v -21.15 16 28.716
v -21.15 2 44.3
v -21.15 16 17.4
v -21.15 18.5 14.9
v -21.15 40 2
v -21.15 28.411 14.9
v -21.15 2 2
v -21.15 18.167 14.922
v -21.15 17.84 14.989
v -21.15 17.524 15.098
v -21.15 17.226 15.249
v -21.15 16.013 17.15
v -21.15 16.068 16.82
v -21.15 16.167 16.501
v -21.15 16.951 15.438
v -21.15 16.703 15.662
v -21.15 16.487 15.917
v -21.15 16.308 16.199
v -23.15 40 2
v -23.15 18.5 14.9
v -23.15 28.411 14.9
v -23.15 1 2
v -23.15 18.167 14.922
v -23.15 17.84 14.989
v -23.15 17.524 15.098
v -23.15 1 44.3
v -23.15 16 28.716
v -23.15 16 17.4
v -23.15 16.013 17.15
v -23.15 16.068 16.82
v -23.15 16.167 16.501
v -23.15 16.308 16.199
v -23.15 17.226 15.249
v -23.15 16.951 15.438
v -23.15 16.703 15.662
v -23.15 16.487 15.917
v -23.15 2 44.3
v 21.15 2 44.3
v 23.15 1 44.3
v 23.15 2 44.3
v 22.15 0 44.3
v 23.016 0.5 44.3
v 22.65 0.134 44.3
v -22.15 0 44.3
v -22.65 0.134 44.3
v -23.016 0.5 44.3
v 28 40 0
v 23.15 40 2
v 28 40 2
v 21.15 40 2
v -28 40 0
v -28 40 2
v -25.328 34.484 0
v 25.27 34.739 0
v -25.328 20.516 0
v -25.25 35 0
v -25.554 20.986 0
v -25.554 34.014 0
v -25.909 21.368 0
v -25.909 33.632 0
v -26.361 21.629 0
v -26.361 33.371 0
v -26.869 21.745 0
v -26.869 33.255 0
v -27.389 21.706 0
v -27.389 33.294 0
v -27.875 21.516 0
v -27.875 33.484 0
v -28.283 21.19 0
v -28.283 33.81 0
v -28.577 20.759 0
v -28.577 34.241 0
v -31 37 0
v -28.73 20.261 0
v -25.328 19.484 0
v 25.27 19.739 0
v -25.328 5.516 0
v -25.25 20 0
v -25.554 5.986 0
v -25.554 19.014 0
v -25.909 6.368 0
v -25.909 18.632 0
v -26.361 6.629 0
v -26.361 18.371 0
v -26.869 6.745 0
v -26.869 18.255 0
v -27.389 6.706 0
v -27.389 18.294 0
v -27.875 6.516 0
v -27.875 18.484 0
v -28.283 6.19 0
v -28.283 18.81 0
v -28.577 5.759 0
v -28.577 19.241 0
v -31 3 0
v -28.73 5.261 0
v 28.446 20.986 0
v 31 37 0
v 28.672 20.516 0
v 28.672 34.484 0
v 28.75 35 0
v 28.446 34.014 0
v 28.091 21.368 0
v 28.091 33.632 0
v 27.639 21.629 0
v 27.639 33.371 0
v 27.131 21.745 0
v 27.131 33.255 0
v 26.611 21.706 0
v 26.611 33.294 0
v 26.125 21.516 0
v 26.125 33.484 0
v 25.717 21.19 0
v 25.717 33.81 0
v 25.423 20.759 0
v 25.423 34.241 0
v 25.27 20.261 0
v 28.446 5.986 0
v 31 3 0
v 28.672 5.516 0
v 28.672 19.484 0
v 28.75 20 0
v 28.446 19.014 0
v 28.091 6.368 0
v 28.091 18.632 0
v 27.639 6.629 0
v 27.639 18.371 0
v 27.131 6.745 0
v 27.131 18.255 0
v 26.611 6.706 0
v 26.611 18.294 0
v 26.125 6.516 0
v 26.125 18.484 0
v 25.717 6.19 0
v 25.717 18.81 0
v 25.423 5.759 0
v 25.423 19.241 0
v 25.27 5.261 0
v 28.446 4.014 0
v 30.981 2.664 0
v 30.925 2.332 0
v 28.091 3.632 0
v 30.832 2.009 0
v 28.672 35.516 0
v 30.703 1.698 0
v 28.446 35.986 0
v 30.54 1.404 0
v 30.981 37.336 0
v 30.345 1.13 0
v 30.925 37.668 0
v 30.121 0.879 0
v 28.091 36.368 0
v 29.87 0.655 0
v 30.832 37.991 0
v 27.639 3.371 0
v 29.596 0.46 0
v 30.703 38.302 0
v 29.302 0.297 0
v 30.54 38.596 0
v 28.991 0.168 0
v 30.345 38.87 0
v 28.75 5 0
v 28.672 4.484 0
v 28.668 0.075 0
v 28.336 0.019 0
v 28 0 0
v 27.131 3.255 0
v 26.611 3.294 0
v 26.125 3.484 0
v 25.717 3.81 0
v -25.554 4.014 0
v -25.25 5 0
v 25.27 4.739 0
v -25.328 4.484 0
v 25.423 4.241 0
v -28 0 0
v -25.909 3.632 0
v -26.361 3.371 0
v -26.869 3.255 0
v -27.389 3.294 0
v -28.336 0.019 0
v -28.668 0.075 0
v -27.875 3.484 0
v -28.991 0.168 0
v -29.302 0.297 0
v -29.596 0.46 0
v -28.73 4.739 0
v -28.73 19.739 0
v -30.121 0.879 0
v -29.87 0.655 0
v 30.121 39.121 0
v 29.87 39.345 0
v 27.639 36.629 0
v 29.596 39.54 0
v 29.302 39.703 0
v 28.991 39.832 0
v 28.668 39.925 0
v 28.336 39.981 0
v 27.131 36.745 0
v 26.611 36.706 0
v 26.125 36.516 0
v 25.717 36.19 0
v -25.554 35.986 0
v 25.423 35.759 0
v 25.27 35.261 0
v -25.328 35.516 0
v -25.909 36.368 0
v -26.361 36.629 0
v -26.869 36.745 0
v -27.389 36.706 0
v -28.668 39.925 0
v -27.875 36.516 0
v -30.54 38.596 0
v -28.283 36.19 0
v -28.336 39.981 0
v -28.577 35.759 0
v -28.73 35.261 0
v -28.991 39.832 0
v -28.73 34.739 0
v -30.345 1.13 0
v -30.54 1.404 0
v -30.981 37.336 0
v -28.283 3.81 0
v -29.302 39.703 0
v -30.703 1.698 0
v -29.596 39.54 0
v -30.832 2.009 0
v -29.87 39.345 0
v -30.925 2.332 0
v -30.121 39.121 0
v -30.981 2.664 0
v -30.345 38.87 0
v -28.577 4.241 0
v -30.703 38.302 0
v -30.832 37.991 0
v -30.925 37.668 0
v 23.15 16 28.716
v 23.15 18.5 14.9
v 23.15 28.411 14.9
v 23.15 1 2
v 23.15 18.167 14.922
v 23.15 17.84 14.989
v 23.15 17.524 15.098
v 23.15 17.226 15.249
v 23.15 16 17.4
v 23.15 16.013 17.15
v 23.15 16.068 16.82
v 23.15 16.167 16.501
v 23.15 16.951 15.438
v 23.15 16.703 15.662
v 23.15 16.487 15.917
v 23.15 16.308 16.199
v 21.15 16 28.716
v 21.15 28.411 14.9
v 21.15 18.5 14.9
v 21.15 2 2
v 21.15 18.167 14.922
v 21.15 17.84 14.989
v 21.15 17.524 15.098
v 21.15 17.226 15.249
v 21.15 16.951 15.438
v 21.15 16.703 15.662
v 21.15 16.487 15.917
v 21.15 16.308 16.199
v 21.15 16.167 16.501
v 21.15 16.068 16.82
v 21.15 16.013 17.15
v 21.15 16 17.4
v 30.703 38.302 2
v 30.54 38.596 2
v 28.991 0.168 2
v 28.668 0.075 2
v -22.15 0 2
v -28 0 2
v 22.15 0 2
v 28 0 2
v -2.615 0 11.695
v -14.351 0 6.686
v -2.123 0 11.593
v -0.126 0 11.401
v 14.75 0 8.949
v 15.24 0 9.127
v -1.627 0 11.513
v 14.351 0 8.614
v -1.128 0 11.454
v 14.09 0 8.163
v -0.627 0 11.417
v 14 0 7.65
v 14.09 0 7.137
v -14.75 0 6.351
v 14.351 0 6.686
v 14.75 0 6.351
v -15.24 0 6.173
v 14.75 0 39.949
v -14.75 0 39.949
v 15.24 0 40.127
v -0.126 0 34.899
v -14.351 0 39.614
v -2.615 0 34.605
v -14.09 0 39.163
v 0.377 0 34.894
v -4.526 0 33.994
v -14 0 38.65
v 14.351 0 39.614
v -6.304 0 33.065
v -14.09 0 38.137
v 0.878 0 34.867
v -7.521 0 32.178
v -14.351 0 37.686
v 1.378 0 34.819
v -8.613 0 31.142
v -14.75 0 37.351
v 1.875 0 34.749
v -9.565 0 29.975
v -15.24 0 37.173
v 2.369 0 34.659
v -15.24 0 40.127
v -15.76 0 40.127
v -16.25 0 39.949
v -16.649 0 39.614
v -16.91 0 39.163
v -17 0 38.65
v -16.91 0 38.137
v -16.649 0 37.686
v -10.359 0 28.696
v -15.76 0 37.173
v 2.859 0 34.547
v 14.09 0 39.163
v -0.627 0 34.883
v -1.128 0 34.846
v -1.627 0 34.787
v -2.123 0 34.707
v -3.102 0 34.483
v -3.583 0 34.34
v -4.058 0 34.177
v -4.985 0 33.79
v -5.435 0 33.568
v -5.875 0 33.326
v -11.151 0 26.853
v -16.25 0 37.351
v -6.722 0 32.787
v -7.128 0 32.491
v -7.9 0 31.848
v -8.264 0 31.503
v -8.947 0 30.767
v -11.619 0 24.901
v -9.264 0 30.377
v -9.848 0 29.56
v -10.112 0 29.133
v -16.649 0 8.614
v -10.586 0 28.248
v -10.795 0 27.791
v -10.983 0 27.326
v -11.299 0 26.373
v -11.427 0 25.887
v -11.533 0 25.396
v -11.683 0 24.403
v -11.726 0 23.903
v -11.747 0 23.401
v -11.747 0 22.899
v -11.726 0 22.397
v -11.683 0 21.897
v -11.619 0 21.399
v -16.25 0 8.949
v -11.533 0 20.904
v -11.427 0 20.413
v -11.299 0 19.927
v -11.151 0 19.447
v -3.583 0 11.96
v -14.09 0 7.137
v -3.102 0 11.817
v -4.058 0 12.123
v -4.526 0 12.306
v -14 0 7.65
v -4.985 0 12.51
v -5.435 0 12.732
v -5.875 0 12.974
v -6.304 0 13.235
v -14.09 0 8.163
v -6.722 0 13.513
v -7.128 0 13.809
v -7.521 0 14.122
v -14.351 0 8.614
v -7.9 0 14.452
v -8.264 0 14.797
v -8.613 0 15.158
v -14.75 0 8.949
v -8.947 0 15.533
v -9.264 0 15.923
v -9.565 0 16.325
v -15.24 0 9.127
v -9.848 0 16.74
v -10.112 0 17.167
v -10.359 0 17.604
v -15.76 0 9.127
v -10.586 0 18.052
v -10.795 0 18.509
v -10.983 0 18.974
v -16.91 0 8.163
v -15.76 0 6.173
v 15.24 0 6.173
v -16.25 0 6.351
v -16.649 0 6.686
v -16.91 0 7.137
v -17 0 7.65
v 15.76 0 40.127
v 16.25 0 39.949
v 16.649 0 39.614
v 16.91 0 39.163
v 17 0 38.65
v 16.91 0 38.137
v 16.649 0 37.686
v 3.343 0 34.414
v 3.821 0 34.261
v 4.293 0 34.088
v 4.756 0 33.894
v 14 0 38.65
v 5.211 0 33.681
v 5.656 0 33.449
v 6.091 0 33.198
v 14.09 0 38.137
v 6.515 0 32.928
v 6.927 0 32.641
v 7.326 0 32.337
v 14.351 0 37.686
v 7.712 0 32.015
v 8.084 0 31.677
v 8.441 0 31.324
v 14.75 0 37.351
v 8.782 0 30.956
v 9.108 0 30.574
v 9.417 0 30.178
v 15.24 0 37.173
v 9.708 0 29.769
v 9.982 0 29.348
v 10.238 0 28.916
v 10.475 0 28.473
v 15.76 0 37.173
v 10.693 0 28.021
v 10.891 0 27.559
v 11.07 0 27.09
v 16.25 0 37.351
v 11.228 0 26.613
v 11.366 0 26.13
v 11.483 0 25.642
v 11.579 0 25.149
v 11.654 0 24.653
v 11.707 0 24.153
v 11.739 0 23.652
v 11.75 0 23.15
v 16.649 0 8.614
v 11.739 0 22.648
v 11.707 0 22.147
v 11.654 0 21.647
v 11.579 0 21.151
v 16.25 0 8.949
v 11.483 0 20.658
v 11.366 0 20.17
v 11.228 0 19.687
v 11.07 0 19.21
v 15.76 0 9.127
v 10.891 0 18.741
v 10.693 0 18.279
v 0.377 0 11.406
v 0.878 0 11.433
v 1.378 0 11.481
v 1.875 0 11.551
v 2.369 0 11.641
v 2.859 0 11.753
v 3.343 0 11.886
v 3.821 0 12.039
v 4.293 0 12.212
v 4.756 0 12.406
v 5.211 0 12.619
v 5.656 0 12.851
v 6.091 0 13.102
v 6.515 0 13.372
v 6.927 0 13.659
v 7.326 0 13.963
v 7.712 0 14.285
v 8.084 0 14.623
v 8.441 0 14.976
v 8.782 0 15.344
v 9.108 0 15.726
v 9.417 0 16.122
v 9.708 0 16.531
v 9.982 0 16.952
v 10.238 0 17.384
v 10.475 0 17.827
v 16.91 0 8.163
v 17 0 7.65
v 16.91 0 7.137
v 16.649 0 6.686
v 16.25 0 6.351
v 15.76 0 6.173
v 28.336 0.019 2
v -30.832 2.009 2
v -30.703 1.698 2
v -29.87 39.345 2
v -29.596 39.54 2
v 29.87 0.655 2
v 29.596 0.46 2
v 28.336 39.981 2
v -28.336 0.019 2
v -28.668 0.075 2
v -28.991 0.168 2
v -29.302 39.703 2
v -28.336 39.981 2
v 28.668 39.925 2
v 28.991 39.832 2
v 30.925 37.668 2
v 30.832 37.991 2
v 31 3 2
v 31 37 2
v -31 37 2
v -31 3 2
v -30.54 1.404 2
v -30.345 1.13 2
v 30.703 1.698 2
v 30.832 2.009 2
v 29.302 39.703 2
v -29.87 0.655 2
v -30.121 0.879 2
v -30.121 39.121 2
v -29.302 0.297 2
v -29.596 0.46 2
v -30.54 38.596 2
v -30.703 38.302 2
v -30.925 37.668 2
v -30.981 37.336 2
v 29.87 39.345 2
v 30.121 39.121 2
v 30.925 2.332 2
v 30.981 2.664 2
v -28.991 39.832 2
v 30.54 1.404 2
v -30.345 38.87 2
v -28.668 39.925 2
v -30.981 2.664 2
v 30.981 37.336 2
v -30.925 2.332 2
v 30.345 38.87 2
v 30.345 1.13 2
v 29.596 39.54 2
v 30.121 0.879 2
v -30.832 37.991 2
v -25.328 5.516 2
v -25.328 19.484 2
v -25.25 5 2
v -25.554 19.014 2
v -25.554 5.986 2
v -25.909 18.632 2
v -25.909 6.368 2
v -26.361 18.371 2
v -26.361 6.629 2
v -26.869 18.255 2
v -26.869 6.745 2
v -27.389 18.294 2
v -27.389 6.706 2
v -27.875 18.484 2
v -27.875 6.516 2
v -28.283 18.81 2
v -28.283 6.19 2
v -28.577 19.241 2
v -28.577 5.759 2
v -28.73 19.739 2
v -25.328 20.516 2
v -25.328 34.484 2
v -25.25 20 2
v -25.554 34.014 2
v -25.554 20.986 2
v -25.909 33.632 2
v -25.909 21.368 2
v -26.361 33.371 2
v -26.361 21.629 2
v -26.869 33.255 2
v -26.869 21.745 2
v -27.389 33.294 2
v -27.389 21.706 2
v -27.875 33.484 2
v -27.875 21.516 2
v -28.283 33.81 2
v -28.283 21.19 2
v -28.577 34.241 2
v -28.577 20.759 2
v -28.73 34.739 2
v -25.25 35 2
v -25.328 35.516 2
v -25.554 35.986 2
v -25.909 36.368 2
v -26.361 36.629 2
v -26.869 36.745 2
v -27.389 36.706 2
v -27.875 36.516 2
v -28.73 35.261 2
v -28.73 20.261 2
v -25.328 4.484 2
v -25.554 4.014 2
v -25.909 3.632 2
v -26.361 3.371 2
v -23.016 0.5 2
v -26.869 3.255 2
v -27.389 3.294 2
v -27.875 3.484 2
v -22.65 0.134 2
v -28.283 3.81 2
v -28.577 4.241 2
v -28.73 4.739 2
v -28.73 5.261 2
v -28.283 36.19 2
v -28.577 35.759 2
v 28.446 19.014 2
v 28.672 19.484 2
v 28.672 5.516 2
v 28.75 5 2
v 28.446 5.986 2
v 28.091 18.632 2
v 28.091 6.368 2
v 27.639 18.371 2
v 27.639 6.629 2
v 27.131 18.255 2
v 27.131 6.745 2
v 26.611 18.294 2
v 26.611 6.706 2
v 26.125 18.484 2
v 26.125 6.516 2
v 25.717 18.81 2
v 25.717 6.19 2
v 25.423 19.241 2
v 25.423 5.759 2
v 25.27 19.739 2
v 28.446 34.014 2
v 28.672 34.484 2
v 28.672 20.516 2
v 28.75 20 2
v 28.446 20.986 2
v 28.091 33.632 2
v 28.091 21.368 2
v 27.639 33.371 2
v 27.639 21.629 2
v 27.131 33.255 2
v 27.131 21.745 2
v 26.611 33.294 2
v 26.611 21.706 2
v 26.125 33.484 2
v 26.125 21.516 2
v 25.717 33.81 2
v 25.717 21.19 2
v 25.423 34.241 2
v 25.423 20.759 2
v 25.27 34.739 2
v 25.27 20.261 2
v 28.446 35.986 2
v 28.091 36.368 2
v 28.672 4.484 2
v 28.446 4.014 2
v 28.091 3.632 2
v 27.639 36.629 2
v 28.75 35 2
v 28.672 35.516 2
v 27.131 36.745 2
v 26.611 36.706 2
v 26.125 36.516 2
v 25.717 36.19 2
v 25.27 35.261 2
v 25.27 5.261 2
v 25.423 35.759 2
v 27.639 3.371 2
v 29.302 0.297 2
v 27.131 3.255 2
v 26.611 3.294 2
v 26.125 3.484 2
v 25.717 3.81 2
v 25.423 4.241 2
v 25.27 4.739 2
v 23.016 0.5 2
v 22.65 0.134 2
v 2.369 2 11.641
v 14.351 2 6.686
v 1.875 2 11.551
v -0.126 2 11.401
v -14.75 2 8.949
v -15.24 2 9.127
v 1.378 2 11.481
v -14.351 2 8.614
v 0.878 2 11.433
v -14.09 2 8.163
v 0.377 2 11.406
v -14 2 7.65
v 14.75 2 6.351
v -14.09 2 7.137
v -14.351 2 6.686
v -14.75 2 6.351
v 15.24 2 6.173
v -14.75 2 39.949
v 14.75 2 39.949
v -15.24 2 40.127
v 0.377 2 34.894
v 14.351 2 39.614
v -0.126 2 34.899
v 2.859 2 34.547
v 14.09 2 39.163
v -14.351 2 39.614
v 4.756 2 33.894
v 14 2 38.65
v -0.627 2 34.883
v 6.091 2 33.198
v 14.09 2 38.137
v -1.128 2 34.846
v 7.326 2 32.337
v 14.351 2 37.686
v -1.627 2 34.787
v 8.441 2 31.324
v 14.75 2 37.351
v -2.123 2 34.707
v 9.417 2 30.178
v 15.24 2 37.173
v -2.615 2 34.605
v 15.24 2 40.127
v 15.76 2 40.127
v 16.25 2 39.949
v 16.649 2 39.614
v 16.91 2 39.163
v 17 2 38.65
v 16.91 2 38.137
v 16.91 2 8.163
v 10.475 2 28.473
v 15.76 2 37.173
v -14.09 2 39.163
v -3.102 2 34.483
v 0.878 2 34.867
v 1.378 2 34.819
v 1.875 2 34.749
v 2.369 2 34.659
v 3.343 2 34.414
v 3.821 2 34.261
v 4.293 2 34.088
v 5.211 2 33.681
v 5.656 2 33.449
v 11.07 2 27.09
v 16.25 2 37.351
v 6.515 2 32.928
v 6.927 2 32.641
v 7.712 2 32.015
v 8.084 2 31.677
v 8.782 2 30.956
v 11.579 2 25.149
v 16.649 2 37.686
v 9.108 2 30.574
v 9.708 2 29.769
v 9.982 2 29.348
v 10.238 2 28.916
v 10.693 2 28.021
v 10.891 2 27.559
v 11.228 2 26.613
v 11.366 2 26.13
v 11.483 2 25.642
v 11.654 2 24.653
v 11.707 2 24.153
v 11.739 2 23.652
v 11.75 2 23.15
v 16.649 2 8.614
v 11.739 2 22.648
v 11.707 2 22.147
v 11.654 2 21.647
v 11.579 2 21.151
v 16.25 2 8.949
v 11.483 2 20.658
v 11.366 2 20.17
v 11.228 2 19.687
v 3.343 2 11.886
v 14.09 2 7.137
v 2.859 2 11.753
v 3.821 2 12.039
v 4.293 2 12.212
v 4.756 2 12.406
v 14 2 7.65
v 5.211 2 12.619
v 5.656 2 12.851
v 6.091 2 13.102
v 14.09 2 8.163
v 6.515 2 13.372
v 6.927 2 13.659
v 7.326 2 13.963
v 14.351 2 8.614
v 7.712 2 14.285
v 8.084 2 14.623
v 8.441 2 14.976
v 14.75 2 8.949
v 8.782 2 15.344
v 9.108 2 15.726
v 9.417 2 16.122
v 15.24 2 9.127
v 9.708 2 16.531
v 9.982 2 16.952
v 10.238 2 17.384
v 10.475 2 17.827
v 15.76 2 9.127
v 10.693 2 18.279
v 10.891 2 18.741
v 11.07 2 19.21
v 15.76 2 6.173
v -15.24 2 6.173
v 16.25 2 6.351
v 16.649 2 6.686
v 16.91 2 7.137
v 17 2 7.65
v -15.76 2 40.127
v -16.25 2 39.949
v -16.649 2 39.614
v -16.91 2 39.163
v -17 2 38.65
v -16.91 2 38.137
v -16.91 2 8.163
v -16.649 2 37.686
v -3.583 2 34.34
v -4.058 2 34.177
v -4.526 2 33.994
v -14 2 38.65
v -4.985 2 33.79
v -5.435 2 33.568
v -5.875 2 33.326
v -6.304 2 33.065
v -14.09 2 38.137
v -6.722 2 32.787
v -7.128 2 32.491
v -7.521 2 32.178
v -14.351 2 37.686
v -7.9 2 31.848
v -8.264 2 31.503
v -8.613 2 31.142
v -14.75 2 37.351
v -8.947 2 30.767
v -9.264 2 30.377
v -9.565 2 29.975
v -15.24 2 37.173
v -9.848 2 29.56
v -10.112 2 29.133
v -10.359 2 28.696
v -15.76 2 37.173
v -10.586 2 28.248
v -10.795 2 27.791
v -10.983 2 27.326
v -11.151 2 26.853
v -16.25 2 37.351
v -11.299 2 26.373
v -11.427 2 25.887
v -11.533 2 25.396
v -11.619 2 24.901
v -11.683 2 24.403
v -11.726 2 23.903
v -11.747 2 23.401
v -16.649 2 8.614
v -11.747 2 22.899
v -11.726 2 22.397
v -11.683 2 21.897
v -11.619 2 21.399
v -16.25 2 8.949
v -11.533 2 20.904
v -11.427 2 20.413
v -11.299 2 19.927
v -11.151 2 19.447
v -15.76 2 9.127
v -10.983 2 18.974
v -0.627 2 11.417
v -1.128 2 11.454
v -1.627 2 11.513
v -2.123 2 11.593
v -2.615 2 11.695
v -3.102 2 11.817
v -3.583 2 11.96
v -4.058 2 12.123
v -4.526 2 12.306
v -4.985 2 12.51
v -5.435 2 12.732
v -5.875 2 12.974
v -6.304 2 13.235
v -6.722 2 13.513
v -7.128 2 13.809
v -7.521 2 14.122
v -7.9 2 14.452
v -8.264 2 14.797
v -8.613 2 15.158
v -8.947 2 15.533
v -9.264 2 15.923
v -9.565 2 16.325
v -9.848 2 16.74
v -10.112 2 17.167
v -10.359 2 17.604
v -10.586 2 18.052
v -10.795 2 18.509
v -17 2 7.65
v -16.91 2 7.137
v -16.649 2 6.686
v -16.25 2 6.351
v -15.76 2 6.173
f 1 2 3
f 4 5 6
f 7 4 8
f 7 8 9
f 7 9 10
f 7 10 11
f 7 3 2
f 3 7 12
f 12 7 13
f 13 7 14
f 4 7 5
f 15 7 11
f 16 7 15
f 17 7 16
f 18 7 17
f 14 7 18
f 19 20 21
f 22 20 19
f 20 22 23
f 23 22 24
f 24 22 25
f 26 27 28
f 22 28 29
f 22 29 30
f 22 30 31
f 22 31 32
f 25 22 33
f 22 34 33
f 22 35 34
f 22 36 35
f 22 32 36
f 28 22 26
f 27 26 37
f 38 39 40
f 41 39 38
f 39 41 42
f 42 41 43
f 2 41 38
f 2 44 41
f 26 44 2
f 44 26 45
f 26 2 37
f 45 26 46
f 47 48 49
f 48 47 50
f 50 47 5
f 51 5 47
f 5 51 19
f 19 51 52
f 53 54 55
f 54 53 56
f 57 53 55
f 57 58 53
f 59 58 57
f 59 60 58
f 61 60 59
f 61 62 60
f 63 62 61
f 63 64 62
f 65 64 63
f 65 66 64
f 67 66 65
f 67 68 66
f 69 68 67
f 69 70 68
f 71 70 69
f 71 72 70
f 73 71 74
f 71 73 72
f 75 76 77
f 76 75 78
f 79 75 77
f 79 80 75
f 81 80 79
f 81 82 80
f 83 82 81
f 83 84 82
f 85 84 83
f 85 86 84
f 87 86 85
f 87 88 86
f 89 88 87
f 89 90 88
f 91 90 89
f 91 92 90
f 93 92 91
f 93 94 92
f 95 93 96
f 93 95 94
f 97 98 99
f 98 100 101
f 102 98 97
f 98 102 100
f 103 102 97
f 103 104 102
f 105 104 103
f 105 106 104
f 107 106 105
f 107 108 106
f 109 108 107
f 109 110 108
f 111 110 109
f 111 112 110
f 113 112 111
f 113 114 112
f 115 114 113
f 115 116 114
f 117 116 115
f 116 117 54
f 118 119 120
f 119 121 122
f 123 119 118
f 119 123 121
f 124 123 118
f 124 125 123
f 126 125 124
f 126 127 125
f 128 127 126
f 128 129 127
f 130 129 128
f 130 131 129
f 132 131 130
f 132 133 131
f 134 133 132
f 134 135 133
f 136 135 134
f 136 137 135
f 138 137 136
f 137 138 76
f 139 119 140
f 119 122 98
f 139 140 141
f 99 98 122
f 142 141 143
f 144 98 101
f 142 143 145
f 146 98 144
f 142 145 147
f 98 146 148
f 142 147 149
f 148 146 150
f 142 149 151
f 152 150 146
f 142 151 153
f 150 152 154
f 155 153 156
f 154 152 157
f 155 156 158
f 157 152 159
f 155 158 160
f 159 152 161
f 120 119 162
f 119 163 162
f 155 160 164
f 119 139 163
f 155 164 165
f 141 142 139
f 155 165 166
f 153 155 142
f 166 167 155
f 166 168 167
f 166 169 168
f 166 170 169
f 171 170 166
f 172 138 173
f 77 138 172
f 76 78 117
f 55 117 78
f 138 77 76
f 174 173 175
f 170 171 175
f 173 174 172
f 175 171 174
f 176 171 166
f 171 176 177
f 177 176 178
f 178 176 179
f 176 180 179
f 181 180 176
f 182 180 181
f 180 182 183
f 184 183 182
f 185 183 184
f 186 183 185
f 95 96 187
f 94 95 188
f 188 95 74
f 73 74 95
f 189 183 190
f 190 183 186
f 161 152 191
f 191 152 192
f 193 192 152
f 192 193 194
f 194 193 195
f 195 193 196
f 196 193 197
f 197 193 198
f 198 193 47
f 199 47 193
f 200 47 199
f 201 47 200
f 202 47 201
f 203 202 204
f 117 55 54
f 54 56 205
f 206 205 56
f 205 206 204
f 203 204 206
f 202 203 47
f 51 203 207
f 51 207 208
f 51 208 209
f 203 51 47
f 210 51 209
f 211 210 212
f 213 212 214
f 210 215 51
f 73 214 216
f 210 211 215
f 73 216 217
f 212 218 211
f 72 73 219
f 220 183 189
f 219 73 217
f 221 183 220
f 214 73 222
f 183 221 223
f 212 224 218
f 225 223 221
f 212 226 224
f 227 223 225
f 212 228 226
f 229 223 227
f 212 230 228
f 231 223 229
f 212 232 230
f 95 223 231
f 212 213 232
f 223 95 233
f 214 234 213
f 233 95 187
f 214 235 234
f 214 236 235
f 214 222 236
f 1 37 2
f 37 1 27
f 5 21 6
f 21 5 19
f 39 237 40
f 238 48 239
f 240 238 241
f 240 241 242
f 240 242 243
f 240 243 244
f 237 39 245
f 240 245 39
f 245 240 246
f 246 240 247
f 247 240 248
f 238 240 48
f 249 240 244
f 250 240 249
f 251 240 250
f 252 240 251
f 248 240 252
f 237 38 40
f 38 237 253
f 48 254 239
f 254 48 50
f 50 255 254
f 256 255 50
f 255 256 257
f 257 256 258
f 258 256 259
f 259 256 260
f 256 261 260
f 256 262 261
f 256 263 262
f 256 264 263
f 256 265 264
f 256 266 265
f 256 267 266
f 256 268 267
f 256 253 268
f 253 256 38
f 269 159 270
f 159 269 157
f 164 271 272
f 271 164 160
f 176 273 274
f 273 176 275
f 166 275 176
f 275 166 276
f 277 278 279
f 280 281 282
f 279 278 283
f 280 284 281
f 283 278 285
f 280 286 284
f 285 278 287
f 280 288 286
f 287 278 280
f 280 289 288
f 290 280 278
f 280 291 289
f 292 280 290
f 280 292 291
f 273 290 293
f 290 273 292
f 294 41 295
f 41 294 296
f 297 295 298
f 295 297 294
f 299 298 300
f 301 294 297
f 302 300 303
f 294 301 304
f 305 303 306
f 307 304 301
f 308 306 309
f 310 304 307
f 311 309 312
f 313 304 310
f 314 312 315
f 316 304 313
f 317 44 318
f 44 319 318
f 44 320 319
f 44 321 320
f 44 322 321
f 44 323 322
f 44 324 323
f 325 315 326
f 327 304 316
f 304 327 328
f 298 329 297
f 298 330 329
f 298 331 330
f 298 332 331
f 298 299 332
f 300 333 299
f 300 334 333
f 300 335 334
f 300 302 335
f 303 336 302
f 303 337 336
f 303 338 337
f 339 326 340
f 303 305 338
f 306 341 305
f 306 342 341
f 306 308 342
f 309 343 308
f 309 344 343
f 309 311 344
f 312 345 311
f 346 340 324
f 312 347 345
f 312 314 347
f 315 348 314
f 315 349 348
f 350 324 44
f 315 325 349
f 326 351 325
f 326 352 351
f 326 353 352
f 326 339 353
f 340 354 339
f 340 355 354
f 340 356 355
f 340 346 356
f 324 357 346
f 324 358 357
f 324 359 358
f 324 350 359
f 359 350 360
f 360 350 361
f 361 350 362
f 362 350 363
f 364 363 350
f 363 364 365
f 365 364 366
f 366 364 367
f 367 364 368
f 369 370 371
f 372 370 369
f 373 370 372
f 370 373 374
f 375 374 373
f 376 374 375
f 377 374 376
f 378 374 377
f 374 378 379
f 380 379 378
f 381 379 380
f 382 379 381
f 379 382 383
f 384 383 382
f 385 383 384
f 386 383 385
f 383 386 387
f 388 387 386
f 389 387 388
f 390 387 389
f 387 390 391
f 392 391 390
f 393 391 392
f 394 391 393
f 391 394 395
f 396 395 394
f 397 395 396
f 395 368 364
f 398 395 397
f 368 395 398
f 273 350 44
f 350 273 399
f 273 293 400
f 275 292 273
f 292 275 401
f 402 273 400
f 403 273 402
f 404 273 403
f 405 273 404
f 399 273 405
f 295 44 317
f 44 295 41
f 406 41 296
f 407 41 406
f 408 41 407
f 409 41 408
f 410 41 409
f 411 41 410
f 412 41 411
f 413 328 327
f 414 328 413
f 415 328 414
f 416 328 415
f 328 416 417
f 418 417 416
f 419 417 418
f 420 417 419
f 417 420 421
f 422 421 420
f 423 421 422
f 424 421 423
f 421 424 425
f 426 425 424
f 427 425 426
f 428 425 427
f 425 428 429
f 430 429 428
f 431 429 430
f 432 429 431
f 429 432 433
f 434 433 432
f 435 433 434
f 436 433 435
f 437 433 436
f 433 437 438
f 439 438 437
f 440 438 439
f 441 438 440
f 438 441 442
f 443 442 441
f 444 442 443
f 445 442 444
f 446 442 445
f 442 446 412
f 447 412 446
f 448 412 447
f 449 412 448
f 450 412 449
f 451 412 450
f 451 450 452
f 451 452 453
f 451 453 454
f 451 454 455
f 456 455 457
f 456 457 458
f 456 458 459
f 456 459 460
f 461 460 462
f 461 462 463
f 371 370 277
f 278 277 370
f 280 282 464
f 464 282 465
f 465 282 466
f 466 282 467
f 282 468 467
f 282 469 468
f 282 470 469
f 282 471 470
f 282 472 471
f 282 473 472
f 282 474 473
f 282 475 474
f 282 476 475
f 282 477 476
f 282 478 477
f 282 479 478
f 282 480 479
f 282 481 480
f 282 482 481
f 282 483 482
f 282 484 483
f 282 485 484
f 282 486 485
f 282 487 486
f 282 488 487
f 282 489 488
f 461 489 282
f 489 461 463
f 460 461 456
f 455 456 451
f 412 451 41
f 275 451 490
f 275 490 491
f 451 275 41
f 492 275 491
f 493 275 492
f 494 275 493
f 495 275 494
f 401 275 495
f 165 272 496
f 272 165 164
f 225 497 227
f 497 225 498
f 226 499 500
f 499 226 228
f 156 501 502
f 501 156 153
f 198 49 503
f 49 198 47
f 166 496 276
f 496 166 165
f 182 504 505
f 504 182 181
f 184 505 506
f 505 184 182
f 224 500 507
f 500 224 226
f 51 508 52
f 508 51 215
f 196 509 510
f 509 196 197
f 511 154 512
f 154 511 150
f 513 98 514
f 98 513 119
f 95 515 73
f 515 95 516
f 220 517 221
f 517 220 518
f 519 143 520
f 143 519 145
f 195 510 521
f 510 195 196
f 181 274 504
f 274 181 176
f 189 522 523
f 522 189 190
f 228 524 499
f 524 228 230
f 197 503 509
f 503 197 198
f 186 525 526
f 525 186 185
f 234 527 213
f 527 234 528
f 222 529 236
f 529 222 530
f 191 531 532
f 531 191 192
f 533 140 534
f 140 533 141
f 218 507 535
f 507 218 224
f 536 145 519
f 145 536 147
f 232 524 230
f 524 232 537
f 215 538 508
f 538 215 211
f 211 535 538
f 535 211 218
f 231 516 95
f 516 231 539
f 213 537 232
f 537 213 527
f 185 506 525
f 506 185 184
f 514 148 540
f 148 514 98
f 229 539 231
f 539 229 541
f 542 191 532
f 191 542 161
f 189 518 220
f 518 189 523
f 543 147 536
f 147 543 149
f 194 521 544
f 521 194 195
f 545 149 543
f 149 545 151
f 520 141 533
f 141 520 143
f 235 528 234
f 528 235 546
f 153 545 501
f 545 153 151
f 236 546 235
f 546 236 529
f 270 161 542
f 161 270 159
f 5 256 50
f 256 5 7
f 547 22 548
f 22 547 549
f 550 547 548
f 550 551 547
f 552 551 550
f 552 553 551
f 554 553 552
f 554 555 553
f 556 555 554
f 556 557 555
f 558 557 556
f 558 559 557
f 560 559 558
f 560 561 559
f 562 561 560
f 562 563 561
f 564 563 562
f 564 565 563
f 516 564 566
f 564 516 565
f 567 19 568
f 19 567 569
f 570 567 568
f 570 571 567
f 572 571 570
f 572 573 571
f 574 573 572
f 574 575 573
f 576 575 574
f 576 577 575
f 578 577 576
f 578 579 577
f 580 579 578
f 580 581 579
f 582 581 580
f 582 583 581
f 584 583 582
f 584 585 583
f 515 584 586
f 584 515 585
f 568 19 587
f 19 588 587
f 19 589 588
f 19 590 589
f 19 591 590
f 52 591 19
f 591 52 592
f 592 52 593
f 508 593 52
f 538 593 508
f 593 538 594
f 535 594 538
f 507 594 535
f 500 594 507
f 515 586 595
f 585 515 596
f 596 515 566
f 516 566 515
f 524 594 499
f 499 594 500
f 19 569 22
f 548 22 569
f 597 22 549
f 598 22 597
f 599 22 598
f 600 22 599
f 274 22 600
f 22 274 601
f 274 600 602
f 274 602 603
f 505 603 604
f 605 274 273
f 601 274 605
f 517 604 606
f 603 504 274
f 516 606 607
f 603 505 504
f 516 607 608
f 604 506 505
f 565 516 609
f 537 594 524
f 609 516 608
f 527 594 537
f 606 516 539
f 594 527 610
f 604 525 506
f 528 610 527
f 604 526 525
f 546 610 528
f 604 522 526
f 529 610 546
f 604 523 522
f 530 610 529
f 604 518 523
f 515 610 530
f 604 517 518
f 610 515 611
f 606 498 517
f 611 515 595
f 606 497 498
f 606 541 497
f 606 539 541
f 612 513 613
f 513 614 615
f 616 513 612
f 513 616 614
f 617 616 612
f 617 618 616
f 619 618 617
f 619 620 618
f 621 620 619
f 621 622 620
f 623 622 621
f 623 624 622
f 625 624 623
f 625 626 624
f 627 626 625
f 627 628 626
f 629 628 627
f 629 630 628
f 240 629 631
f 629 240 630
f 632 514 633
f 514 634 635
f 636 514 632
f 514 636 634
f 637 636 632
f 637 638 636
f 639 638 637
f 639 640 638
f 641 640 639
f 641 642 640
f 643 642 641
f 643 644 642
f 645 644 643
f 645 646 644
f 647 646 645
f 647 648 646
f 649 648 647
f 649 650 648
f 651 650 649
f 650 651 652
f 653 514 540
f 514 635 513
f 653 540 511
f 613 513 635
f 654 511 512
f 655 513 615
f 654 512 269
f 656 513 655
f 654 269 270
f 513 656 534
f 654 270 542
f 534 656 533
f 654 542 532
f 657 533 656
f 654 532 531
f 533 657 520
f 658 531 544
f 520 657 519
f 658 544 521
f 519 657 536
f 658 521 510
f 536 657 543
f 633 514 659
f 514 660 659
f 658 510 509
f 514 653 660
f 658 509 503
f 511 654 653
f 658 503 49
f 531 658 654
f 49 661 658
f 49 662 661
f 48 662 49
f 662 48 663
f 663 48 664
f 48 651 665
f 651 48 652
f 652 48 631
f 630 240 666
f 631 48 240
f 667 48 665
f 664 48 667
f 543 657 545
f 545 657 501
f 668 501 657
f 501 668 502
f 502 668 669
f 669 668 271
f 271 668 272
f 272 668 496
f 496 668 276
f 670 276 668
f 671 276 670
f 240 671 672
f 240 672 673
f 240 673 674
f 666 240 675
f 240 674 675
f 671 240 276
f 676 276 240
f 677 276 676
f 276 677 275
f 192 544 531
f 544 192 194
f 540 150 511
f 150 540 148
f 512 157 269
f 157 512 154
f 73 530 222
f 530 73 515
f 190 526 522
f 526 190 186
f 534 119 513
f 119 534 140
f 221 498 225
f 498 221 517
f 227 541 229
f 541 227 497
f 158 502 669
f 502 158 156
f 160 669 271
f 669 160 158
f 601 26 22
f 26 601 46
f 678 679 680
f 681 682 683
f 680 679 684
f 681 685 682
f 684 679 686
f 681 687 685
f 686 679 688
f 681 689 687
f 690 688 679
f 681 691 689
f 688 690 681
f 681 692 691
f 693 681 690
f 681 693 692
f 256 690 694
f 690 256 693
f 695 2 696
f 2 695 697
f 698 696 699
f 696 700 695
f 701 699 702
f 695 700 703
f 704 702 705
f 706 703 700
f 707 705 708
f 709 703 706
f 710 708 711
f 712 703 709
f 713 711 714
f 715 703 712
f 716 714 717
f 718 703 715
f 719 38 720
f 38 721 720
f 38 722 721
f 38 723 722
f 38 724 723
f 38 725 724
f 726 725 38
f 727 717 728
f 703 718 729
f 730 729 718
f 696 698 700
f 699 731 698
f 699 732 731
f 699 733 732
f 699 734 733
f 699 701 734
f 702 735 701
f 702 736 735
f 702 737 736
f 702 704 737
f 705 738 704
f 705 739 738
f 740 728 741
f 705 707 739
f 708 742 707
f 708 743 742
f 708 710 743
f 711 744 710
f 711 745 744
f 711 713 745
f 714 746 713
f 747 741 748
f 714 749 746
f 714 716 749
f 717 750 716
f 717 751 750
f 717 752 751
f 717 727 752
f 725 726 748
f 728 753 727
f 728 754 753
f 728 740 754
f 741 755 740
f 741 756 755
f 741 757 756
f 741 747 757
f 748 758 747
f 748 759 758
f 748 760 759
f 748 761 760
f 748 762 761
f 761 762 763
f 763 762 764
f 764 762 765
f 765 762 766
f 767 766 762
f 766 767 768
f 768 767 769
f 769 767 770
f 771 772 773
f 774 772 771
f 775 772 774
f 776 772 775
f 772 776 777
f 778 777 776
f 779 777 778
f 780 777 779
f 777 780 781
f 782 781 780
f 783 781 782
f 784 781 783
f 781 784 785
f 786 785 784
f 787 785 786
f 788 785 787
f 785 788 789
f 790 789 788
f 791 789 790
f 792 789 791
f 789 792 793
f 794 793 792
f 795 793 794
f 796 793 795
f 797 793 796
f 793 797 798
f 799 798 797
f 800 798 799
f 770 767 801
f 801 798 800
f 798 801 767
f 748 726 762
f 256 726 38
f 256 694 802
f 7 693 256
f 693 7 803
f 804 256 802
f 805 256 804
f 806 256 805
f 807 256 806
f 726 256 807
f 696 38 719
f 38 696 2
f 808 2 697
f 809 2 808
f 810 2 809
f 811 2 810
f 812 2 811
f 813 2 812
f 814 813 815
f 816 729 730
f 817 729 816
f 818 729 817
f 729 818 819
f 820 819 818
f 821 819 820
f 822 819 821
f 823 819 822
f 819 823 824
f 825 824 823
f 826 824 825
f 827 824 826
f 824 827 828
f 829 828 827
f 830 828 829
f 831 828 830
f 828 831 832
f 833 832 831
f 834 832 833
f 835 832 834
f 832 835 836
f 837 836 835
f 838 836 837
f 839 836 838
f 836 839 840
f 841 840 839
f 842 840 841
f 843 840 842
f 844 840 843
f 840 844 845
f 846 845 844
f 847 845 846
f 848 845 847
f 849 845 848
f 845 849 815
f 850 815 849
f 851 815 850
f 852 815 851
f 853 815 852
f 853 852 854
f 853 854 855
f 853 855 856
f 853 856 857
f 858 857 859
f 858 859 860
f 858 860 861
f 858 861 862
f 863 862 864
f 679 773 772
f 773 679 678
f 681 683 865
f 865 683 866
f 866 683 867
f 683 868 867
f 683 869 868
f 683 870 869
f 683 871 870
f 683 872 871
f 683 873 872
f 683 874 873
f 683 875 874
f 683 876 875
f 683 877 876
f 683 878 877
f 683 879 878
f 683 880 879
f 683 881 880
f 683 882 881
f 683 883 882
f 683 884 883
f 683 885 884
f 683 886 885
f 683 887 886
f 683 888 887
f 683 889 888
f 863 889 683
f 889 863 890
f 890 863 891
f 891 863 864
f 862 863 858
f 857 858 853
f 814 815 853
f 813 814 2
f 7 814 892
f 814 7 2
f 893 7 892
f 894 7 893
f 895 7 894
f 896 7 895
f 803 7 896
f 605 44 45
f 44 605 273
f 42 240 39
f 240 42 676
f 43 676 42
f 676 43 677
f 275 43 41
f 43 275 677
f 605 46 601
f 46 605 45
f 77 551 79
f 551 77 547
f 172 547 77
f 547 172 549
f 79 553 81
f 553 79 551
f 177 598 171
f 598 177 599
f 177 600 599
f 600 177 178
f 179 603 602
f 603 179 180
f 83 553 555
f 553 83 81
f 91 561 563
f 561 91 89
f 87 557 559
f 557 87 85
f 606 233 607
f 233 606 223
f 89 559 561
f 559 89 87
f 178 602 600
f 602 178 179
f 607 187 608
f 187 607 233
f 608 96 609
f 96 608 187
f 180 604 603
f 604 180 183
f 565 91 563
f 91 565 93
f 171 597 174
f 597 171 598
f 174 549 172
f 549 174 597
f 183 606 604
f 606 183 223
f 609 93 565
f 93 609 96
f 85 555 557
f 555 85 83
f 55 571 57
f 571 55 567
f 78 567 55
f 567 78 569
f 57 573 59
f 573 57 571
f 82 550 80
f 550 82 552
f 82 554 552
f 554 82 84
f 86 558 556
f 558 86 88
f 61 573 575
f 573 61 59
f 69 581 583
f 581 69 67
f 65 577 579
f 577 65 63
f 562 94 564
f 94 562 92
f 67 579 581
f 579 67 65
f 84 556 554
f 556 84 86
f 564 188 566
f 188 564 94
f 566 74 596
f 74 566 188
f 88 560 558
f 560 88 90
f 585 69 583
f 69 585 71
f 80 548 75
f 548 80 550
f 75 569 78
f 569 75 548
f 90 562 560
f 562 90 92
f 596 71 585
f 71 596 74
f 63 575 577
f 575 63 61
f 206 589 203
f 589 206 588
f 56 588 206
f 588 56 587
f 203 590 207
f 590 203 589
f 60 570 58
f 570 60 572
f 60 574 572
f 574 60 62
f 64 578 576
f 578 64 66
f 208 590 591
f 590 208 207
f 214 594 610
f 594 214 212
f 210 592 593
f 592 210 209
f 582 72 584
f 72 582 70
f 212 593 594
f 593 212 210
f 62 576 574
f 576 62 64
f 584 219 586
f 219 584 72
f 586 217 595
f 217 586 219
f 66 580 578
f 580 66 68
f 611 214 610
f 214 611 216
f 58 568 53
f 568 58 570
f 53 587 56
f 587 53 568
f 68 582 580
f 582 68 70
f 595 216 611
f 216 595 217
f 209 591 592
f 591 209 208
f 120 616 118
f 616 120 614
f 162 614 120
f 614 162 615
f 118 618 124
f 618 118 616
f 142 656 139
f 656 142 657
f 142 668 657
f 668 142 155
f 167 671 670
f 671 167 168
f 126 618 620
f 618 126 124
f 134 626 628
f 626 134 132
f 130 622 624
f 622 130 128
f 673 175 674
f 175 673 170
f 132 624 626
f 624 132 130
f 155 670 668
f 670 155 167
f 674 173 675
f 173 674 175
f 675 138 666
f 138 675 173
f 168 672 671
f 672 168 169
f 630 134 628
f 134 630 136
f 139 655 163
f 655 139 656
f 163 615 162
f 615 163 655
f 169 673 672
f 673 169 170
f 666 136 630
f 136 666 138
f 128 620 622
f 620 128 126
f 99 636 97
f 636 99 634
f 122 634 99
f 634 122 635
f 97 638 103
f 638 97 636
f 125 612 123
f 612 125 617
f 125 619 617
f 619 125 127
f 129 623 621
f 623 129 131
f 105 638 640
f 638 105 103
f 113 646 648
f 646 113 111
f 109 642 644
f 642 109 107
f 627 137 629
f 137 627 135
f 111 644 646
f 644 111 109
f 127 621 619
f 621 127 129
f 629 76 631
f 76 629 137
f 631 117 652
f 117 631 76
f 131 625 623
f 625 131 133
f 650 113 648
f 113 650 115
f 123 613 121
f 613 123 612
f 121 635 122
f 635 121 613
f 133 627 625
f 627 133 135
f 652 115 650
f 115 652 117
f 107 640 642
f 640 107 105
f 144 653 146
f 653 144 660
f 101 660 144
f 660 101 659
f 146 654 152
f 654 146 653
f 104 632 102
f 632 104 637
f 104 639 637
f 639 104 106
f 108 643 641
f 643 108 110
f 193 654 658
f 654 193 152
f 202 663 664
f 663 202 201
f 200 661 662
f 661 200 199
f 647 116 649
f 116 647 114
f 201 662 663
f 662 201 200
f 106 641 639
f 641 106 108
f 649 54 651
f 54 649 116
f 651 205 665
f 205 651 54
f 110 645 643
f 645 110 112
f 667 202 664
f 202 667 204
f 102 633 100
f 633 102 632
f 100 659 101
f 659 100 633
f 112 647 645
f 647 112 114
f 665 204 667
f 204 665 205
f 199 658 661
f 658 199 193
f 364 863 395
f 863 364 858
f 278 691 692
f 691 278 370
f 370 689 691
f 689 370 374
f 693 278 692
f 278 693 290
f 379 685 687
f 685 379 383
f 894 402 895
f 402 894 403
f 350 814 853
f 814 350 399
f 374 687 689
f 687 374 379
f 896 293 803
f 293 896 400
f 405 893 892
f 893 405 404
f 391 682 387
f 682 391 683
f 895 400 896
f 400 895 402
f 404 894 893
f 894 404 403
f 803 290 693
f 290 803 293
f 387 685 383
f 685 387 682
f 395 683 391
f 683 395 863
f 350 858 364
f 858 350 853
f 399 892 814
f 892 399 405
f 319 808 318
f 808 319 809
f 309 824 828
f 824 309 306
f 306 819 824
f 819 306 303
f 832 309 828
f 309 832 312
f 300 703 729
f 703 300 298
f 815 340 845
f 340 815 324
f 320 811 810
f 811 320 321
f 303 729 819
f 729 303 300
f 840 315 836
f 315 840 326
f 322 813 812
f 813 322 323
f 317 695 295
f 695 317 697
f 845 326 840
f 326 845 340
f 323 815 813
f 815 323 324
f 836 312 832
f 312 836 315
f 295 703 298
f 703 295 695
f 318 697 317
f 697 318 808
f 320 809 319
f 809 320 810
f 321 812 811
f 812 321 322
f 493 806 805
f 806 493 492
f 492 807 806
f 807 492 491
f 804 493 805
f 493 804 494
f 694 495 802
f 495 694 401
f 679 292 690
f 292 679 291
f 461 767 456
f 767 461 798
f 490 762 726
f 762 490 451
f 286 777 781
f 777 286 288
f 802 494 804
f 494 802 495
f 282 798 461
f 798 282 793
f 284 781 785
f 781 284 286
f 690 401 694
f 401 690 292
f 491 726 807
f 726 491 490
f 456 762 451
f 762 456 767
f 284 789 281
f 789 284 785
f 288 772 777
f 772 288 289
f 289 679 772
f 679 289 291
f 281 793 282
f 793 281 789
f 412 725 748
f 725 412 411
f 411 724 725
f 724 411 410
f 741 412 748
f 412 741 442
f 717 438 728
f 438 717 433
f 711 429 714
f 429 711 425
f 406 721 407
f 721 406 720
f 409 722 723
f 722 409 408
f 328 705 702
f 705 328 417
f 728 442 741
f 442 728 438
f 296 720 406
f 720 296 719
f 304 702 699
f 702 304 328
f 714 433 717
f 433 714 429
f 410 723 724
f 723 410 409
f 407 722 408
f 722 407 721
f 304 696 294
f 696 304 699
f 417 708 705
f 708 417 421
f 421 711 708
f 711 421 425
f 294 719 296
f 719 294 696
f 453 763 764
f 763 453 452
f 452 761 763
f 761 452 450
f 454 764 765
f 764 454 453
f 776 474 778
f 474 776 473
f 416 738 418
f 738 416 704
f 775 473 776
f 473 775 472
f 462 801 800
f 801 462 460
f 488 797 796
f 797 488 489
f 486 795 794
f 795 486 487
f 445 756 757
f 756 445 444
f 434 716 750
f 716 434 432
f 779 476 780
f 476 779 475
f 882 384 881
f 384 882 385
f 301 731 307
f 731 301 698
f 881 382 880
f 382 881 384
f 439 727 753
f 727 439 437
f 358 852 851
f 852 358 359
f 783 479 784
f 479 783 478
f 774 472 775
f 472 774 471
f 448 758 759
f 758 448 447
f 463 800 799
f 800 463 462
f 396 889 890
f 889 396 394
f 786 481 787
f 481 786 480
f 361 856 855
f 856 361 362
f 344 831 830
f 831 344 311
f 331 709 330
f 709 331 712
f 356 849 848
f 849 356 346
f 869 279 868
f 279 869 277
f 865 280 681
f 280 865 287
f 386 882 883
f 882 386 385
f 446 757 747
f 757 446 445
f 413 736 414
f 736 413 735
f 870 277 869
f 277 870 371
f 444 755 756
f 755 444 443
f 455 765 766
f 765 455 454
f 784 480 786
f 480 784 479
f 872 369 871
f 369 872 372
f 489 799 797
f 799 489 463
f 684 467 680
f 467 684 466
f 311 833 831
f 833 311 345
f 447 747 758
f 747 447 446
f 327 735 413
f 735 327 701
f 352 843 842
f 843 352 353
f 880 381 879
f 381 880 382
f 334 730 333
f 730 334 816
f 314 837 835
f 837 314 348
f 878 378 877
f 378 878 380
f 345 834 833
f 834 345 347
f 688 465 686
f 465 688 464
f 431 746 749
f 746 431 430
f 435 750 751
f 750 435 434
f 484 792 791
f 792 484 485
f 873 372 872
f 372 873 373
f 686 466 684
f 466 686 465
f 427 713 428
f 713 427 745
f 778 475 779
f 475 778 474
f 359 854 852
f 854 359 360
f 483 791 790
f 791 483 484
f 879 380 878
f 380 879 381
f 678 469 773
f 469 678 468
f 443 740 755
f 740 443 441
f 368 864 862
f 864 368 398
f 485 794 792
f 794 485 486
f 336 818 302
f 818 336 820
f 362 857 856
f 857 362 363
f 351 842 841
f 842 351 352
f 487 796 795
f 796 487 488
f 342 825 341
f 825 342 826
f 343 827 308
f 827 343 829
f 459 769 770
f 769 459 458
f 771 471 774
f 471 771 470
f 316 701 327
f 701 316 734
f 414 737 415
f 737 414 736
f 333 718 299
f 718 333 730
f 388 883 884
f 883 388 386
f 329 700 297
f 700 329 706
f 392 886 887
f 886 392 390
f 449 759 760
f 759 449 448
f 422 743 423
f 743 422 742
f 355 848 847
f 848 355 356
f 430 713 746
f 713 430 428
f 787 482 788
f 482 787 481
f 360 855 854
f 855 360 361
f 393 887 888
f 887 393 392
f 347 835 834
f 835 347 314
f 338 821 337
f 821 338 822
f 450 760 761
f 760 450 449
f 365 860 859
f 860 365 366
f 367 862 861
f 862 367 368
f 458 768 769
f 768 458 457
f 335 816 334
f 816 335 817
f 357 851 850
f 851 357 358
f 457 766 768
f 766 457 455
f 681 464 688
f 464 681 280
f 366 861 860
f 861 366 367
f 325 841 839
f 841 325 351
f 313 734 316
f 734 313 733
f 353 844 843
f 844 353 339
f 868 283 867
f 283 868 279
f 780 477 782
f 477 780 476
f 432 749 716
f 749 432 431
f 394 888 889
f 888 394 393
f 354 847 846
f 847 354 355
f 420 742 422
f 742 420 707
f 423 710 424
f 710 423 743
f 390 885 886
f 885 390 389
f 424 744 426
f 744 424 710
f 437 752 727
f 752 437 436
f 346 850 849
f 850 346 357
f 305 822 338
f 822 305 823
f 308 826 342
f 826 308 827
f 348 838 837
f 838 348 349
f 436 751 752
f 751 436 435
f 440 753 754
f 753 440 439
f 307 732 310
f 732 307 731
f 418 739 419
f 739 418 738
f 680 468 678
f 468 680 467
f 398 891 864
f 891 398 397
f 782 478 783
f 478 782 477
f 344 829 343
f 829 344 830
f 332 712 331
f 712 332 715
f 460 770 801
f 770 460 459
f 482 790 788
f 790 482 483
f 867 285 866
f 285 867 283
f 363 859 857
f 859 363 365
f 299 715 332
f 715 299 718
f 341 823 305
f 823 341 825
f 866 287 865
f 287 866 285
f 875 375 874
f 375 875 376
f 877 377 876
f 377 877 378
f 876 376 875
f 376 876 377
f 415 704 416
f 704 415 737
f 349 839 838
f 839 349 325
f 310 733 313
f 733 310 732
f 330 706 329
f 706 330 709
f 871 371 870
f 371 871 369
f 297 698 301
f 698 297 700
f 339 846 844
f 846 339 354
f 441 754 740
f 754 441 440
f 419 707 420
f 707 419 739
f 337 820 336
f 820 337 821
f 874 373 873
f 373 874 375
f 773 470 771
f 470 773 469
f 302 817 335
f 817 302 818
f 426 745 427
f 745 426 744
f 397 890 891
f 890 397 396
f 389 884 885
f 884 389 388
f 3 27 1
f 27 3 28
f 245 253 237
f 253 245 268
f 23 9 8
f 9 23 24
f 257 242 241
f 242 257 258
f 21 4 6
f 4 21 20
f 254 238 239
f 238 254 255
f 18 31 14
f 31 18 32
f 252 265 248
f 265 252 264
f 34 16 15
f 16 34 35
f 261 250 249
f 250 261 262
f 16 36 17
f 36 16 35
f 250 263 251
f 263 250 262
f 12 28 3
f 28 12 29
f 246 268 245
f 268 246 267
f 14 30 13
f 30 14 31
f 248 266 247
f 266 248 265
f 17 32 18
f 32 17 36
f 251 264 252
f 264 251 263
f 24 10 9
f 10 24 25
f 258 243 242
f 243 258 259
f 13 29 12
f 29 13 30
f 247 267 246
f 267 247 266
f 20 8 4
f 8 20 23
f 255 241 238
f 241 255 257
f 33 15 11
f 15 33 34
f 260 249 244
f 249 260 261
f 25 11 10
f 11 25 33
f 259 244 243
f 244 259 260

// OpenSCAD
// The thickness of the mount plate (in mm)
mountplate_thickness = 2 ; // [0:10]
// The thickness of the motor mount plate (in mm)
motormountplate_thickness = 2 ; // [2:7]

/* [Hidden] */
layer_height=.25; extrusion_width=.5;
epsilon=.01;

module smoothen(r) {
 offset(r=+r,$fn=r*PI*6) offset(delta=-r) children();
}

module the_bracket(
 mountplate_size=[62,40],
 mountplate_r = 3,
 mounthole_d = 3.5,
 mountholes_span=[54,30],
 motor_side=42.3,
 motor_protrusion_hole_d = 23.5,
 motormountholes_span = 31,
 thickness = 2,
 motormountplate_thickness = 2.5,
 mountplate_thickness = 2,
 motormounthole_d = 3,
 motorconnector_width = 16.5,
 motorconnector_hole_r = 2.5,
 motorconnector_distance = 16.5,
 mountscrew_l = 10, mountscrewhead_d = 6, mountscrewhead_h = 3,
 mounthole_depth = 5,
 motormounthole_depth = 4,
 extra_spacer = 0
) {
 titan_h = 25; titan_bowdenmount_h = 4;
 echo("max longscrew",titan_h+motormountplate_thickness+extra_spacer+motormounthole_depth);
 echo("max shortscrew",titan_bowdenmount_h+motormountplate_thickness+extra_spacer+motormounthole_depth);
 difference() {
  union() {
   // mount plate
   linear_extrude(height=mountplate_thickness)
   smoothen(r=mountplate_r)
   translate([-mountplate_size.x/2,0])
   square(size=mountplate_size);
   // motor mount plate
   hull() for(sx=[-1,1])
   translate([sx*(motor_side/2+thickness-motormountplate_thickness/2),motormountplate_thickness/2,0])
   cylinder(d=motormountplate_thickness,h=motor_side+mountplate_thickness,$fn=motormountplate_thickness*PI*2);
   // sides
   for(sx=[-1,1]) translate([sx*(motor_side+thickness)/2,0,0])
   hull() {
    translate([-thickness/2,motormountplate_thickness/2,0])
    cube(size=[thickness,mountplate_size.y-motormountplate_thickness/2,mountplate_thickness]);
    translate([-thickness/2,motormountplate_thickness/2,0])
    cube(size=[thickness,motormountplate_thickness/2,mountplate_thickness+motor_side]);
   }
  }
  // mount holes
  for(sx=[-1,1]) for(sy=[-1,0,1])
   translate([sx*mountholes_span.x/2,sy*mountholes_span.y/2,0])
   translate([0,mountplate_size.y/2,0]) {
    translate([0,0,-1])
    cylinder(d=mounthole_d,h=mountplate_thickness+2,$fn=mounthole_d*PI*2);
    translate([0,0,mountscrew_l-mounthole_depth])
    cylinder(d=mountscrewhead_d,h=mountplate_thickness+1,$fn=mountscrewhead_d*PI*2);
   }
  // motor protrusion cutout
  translate([0,0,mountplate_thickness+motor_side/2])
  rotate([-90,0,0]) translate([0,0,-1])
  cylinder(d=motor_protrusion_hole_d,h=motormountplate_thickness+2,$fn=motor_protrusion_hole_d*PI*2);
  // motor mount holes
  for(sx=[-1,1]) for(sz=[-1,1])
   translate([sx*motormountholes_span/2,0,sz*motormountholes_span/2])
   translate([0,0,mountplate_thickness+motor_side/2])
   rotate([-90,0,0]) translate([0,0,-1])
   cylinder(d=motormounthole_d,h=motormountplate_thickness+2,$fn=motormounthole_d*PI*2);
  // motor connector cutout
  translate([mountplate_size.x/2,
             motormountplate_thickness+extra_spacer+motorconnector_distance-motorconnector_hole_r,
             mountplate_thickness+motor_side/2-motorconnector_width/2])
  rotate([0,-90,0])
  linear_extrude(height=mountplate_size.x)
  smoothen(r=motorconnector_hole_r)
  square([motor_side+mountplate_thickness+1,mountplate_size.y]);
 }//difference
}//the_bracket module

// mountplate_thickness = 5.1
the_bracket(mountplate_thickness=mountplate_thickness,motormountplate_thickness=motormountplate_thickness);
